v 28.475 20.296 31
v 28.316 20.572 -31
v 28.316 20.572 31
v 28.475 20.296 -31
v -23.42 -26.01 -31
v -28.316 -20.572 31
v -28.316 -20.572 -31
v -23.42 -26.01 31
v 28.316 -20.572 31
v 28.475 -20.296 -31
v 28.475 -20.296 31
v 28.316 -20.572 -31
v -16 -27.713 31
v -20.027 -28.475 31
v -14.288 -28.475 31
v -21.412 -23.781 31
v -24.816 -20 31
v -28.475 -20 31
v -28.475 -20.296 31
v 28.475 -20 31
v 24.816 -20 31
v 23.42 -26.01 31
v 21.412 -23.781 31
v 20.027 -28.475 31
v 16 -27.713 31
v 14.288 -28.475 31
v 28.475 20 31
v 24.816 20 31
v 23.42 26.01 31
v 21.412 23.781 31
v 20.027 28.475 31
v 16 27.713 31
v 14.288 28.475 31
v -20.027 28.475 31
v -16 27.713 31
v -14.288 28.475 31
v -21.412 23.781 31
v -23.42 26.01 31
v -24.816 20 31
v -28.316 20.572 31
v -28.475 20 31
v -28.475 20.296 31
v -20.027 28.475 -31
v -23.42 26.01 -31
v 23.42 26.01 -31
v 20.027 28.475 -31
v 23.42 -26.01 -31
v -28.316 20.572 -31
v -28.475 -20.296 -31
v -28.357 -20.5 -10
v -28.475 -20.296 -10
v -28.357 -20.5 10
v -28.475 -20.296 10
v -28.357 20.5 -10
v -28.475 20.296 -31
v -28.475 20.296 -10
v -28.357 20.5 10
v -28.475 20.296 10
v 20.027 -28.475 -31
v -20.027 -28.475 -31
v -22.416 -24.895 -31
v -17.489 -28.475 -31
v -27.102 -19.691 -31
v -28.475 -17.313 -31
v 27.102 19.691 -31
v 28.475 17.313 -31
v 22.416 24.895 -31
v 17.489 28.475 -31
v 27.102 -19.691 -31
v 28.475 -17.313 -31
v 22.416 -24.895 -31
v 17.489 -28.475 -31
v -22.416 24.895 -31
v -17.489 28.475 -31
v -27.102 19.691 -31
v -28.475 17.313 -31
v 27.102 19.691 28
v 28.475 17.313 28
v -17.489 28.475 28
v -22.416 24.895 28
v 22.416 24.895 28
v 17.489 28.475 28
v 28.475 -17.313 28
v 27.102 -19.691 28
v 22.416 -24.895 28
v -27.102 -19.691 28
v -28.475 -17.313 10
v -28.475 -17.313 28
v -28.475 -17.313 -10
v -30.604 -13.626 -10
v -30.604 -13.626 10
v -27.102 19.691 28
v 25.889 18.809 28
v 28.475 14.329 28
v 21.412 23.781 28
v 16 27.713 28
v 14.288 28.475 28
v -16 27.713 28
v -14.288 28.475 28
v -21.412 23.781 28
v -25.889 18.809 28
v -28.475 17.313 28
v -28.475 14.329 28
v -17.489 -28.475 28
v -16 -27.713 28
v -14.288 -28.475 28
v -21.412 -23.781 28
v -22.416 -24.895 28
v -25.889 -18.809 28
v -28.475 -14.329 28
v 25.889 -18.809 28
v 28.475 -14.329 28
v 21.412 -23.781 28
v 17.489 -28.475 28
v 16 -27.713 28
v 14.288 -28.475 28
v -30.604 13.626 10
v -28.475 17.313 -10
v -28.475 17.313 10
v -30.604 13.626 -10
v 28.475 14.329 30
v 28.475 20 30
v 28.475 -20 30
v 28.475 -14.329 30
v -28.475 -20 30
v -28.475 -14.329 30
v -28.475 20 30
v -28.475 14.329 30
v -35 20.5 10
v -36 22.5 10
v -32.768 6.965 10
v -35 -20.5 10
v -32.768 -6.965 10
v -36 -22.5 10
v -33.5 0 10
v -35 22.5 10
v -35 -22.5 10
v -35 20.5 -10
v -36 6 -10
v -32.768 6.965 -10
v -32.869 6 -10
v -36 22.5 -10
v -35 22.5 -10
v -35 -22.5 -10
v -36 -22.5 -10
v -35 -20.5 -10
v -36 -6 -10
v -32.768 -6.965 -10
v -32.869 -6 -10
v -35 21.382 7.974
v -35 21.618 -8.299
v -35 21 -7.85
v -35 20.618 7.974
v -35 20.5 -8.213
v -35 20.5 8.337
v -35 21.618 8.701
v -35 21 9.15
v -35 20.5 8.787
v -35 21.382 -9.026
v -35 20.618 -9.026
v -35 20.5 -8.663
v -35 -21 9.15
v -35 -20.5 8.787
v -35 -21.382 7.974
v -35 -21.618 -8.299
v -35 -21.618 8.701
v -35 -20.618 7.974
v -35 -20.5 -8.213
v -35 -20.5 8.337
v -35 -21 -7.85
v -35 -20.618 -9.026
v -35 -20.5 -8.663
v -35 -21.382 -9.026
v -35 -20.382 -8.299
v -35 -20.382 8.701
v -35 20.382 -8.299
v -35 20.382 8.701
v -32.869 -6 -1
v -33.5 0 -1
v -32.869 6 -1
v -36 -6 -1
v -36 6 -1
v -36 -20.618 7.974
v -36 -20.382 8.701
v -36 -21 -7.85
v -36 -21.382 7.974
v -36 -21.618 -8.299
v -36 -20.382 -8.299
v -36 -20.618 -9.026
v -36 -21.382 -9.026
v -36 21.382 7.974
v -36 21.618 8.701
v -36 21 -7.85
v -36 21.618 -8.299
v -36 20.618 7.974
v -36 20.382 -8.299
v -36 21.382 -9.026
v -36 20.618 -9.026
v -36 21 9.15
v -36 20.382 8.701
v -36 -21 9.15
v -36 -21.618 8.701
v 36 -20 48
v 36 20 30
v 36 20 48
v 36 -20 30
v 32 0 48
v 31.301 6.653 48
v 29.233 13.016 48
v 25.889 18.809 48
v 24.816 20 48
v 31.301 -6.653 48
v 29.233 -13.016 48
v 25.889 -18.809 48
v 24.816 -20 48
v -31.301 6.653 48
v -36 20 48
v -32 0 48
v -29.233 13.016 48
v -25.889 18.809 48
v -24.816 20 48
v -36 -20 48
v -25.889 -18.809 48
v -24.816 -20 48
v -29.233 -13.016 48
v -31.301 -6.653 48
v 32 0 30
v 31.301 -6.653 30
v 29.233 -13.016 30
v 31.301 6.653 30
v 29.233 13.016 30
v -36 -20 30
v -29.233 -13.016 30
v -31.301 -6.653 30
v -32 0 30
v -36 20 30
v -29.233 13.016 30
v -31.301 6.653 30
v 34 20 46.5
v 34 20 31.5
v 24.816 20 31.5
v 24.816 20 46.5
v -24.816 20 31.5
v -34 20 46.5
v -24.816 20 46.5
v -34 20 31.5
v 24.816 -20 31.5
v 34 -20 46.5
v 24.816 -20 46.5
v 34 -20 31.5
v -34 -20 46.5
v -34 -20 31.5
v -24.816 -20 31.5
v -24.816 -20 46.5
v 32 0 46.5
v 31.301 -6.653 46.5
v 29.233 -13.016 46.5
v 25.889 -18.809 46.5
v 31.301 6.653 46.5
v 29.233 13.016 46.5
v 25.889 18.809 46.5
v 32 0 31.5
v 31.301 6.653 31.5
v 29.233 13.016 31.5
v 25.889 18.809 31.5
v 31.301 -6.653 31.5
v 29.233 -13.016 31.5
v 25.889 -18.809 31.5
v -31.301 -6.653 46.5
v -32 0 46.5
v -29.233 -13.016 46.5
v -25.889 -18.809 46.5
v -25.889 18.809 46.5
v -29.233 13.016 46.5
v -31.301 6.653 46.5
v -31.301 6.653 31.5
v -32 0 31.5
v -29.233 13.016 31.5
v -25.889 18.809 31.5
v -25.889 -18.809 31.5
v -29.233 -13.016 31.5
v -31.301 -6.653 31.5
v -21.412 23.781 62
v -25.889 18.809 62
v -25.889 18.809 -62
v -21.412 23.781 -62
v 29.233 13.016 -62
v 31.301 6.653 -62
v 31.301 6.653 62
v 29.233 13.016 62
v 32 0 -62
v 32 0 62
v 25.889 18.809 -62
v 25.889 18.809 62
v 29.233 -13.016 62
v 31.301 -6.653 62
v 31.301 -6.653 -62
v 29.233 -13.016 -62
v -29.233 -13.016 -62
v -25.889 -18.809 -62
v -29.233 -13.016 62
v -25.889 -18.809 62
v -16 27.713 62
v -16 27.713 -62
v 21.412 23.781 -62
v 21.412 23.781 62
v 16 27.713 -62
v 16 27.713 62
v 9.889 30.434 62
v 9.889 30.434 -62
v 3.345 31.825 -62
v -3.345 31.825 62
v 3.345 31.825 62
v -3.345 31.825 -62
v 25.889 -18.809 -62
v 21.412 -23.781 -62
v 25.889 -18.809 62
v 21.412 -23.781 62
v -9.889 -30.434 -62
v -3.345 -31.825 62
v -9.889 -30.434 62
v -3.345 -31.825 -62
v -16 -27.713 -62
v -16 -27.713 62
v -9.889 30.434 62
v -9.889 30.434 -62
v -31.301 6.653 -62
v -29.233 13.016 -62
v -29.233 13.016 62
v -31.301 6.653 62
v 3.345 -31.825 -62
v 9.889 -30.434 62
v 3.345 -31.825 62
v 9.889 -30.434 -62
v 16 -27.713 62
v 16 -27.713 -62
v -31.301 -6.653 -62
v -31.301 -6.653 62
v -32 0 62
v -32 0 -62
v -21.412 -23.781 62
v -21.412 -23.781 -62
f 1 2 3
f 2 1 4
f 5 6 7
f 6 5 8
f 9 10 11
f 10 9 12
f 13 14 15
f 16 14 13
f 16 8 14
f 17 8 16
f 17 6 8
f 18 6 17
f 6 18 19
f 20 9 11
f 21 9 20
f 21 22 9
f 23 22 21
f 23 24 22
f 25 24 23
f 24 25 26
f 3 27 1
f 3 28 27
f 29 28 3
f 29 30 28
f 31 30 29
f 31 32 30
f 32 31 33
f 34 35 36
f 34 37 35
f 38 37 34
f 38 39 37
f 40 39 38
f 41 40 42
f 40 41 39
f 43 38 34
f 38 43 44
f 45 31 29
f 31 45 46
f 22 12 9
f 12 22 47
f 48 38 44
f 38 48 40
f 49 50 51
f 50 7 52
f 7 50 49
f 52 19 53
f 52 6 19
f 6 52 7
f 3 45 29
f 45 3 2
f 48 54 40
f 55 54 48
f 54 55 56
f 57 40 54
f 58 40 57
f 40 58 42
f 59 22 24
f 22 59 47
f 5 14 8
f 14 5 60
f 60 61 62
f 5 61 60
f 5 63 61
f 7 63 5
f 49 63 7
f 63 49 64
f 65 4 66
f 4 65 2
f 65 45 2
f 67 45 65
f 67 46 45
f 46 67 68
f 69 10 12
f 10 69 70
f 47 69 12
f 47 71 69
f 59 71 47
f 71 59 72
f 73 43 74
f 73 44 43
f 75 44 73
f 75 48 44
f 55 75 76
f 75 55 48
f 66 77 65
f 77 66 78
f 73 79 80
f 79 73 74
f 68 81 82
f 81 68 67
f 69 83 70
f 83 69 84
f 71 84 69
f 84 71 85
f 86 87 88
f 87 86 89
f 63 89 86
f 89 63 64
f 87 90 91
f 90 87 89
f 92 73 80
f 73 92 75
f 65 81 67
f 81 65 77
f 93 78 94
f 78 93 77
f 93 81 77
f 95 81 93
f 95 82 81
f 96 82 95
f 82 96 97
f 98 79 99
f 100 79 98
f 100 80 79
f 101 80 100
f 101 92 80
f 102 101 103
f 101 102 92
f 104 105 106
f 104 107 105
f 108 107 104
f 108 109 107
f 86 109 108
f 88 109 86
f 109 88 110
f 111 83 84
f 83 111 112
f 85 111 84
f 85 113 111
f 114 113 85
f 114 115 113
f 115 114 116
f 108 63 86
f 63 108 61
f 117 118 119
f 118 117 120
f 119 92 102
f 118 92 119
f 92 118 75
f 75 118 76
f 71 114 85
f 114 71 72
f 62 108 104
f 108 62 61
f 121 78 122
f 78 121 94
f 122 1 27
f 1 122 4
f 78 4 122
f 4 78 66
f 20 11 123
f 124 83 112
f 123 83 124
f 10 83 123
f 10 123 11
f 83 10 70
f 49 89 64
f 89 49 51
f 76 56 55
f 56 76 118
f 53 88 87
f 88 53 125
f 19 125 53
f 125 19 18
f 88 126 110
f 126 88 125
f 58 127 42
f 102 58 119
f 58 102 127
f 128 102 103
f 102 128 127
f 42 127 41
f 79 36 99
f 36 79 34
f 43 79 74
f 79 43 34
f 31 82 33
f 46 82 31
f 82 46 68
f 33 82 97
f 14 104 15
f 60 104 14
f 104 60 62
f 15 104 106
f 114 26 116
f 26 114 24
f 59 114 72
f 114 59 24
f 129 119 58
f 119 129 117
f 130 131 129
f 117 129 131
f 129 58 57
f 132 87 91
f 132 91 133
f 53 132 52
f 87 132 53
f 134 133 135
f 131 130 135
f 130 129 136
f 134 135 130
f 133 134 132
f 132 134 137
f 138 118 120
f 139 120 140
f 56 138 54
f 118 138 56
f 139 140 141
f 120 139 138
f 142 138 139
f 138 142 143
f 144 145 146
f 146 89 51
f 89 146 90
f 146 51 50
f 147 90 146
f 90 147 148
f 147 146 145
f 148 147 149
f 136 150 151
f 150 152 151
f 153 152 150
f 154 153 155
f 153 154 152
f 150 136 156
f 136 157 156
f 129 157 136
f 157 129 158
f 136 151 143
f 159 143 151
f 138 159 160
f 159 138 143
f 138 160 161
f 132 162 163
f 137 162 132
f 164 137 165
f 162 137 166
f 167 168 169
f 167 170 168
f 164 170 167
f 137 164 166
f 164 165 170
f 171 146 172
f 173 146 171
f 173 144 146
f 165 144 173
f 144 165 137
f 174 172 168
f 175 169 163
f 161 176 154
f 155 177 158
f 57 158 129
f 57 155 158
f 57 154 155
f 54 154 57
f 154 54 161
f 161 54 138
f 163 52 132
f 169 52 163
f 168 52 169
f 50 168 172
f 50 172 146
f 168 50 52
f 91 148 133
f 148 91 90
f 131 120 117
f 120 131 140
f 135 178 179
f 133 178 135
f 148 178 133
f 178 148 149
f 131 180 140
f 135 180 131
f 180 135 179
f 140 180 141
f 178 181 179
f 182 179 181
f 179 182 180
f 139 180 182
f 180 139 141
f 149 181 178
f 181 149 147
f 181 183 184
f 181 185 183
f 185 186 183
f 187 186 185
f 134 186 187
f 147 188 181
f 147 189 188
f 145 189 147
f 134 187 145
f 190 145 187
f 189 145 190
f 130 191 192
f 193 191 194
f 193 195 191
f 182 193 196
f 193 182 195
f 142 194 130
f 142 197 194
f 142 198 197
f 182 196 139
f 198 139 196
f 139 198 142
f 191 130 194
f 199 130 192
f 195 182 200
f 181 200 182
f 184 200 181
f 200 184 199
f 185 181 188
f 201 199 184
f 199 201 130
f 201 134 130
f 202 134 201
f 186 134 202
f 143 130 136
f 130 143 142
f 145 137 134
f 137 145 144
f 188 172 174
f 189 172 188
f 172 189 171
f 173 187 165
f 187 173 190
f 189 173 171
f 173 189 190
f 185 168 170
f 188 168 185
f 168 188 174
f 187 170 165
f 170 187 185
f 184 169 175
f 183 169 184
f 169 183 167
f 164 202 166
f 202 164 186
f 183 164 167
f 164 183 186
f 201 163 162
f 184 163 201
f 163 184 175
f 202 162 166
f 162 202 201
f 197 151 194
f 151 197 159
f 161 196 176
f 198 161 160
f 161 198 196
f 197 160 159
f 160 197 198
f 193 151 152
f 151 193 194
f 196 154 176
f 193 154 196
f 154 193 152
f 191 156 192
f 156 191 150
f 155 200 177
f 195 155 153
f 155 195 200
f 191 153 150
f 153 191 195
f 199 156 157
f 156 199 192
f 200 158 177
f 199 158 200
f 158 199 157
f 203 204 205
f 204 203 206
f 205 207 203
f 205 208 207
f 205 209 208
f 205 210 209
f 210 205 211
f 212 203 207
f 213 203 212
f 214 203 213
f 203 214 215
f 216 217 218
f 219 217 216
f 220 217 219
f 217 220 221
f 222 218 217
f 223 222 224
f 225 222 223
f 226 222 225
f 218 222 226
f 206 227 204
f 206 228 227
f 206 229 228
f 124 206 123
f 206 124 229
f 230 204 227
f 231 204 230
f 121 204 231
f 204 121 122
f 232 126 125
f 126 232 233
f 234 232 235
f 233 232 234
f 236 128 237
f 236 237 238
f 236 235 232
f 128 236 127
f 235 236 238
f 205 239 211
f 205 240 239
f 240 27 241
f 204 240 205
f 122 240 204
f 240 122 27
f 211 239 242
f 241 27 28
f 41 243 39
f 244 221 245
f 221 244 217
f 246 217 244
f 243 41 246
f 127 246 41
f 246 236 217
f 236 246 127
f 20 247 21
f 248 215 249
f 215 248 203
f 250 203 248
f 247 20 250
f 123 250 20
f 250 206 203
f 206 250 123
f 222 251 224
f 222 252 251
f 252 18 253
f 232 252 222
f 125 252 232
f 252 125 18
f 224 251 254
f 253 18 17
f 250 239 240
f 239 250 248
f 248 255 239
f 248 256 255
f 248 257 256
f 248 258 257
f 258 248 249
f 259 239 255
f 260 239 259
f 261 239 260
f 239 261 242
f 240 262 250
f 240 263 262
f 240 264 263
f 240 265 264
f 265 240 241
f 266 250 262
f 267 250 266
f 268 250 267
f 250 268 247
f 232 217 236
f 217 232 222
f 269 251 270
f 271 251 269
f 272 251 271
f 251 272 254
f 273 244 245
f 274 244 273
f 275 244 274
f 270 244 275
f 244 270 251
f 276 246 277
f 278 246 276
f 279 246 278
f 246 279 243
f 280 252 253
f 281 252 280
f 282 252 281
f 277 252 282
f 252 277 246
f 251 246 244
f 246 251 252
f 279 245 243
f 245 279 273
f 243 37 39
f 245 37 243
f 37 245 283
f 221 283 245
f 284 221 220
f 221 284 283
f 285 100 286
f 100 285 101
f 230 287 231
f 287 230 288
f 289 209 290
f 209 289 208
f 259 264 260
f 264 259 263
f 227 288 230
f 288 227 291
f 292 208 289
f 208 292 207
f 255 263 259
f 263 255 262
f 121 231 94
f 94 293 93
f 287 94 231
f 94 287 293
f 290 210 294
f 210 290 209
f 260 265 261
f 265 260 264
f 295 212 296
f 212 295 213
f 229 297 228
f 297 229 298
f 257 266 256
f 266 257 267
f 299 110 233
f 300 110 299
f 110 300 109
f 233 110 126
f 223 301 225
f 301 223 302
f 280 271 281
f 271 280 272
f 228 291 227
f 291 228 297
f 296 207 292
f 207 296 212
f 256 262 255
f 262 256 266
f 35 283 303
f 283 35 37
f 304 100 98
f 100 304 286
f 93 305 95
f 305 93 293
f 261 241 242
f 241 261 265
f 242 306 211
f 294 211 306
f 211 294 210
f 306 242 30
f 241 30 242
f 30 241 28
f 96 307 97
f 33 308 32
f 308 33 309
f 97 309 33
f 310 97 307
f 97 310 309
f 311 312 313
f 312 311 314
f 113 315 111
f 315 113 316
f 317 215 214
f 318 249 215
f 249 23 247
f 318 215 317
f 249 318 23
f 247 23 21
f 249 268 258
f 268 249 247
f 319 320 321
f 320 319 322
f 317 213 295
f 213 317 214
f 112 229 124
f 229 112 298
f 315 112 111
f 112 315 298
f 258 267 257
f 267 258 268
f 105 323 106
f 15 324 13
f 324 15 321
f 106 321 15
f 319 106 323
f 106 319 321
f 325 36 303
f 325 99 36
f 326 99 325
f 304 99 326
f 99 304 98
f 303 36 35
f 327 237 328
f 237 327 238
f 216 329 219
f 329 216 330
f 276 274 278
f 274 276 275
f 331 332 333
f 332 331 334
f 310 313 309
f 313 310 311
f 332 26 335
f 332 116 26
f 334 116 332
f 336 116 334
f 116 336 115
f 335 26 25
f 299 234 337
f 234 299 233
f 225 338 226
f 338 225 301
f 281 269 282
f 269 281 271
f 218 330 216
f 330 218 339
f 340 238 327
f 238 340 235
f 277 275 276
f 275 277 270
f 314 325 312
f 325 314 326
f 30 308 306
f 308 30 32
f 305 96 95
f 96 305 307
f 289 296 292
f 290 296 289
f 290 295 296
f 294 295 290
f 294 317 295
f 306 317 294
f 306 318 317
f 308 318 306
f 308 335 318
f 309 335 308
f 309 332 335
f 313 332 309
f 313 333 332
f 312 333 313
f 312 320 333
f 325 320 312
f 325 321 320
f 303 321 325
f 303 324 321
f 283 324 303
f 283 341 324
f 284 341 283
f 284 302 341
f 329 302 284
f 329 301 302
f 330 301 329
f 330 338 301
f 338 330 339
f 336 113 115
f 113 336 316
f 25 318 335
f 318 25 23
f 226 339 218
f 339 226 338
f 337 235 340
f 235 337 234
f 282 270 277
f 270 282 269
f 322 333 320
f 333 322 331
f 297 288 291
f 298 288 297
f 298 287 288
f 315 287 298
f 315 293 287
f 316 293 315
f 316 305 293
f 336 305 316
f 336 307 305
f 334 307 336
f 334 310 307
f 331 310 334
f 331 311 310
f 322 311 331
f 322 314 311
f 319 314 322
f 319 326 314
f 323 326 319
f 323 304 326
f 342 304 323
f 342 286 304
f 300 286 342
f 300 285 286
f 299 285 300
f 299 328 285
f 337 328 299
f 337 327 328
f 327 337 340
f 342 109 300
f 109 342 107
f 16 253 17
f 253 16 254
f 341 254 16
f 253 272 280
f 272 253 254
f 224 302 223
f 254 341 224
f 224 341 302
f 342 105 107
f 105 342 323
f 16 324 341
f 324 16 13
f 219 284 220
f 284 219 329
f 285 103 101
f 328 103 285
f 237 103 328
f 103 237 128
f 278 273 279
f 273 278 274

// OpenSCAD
canD = 67;
canH = 124;
wall = 3;
UltraWid = 45;
UltraLen = 20;
UltraHole = 1.3;
module can() {
	intersection() {
		difference() {
			cylinder(d = canD+wall,h = canH/2, center = true);
                translate([0,0,-wall])
                cylinder(d = canD, h = canH/2, center=true);
		}
		cube([canD*0.85,canD*0.85,canH], center=true);
	}
    difference() {
        translate([-canD/2+6,0,0])
        cube([15, UltraWid-4, UltraLen], center=true);
            translate([0,0,0])  
            cylinder(d = canD,h = canH/2, center = true); 
        translate([-canD/2,0,-6])
        cube([4,12,10],center=true);
    }
    difference() {
        translate([-canD/2-2,0,0])
        cube([1, UltraWid, UltraLen],center=true);
        //Mounting holes for the ultrasonic sensor
        translate([0,-21,-17/2])
        rotate([0,270,0])
        cylinder(d=UltraHole,h=100);
        translate([0,-21,17/2])
        rotate([0,270,0])
        cylinder(d=UltraHole,h=100);
        translate([0,21,-17/2])
        rotate([0,270,0])
        cylinder(d=UltraHole,h=100);
        translate([0,21,17/2])
        rotate([0,270,0])
        cylinder(d=UltraHole,h=100);
        //RUNS INTO CAN (not anymore)
        translate([-canD/2-1,0,-6])
        cube([4,12,10],center=true);
    }
    //battery mounting
    translate([0,-20,30])difference() {
        cube([36, 40,18]);
        translate([2+32/2,0,1.5+15/2])cube([32,100,15], center = true);
        
    }
    translate([-36,-20,30])difference() {
        cube([36, 40,18]);
        translate([2+32/2,0,1.5+15/2])cube([32,100,15], center= true);
        
    }
}
can();
//translate([0,0,-wall])
#cylinder(d = canD-wall, h = canH, center=true);
